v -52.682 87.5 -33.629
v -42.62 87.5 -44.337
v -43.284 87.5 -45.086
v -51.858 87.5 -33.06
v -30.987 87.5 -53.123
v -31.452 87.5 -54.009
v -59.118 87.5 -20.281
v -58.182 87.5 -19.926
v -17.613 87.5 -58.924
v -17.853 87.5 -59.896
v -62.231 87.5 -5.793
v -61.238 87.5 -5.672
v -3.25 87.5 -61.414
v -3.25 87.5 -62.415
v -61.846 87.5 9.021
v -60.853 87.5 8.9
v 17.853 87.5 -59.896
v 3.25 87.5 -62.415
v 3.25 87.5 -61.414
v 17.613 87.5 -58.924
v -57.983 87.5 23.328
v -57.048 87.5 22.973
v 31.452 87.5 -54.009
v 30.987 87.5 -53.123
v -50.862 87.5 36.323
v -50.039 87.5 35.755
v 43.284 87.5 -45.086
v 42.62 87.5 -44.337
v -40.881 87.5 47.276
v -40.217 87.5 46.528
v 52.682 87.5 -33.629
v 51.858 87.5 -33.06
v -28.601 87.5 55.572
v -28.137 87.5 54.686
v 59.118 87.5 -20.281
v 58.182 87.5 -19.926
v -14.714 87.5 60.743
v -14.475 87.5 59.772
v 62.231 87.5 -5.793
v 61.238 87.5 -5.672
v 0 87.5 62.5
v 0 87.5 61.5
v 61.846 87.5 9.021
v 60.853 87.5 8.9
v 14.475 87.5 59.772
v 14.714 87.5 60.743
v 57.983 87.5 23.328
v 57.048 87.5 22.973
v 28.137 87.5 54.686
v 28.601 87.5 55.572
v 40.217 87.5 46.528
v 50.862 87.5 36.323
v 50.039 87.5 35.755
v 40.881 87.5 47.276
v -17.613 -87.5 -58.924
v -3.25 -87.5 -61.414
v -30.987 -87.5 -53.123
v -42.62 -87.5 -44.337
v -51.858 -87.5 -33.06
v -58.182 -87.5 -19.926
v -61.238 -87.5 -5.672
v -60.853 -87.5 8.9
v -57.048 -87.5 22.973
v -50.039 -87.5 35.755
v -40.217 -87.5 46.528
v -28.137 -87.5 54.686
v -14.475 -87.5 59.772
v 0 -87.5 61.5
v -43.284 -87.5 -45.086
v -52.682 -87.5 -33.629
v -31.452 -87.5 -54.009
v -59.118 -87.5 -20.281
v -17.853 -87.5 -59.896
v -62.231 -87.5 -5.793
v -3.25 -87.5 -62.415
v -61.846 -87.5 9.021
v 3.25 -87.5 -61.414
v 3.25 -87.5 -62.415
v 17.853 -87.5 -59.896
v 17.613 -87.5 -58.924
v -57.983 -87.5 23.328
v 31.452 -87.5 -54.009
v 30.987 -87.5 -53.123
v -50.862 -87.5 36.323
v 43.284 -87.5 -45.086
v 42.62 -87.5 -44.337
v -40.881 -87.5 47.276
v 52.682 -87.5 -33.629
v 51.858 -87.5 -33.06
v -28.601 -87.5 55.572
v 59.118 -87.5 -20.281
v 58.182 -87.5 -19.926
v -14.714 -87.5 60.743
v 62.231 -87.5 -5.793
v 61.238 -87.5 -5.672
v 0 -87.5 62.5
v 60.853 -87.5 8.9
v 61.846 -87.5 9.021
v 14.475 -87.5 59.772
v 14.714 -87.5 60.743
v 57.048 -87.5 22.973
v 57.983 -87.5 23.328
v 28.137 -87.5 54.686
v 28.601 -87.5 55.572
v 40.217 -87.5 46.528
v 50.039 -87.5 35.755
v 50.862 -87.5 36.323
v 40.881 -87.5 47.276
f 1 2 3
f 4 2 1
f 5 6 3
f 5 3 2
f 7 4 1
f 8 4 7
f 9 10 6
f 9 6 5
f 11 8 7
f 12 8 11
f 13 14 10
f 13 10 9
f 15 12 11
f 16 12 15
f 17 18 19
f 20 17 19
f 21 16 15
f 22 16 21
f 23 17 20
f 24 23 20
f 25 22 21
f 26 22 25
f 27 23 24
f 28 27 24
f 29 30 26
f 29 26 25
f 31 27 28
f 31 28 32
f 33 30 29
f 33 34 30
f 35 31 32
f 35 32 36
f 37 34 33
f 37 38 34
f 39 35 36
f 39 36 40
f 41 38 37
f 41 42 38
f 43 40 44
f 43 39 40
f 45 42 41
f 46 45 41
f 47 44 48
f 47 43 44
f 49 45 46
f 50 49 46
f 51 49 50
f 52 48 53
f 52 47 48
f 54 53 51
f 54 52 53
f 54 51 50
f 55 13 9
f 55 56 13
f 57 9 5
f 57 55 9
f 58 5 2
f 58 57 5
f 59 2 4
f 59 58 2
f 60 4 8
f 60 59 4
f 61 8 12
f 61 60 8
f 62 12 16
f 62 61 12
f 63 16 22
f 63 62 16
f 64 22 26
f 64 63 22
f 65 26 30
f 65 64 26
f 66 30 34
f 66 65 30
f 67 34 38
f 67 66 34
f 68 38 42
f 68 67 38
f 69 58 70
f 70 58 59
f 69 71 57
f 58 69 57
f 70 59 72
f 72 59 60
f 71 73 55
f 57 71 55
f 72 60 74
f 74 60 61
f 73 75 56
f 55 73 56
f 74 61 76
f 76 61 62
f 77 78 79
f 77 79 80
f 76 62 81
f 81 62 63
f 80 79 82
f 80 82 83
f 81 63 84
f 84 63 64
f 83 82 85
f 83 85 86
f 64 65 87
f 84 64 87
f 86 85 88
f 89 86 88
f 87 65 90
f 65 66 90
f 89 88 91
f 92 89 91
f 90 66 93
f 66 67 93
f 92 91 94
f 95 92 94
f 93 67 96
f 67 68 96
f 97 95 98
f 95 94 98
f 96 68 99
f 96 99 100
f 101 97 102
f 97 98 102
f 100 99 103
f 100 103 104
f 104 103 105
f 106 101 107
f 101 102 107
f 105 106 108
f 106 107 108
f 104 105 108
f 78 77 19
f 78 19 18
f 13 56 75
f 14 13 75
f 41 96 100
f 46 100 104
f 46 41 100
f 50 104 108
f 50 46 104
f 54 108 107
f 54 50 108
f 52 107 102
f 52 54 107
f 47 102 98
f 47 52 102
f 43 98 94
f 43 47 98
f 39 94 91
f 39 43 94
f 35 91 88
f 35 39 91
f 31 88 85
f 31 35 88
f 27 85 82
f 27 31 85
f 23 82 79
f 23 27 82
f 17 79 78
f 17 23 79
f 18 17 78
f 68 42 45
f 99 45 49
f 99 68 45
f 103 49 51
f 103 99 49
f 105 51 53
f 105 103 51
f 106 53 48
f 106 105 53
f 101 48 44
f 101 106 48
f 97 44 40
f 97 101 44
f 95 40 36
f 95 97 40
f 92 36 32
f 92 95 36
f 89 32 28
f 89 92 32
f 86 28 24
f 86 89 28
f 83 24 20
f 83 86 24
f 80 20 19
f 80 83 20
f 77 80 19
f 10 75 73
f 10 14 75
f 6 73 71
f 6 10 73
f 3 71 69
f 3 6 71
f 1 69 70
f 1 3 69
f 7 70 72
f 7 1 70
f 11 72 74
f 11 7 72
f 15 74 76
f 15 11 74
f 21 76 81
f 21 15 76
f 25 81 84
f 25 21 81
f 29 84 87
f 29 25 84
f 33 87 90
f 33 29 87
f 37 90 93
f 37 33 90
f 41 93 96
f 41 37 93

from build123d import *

# Parameters (mm, degrees)
SKETCH1_R           = 62.5
SKETCH1_R_2         = 61.5
BOSS_EXTRUDE1_DEPTH = 87.5
SKETCH2_W           = 6.5
SKETCH2_H           = 1.085934022
CUT_EXTRUDE1_DEPTH  = 197.054839267


with BuildPart() as part:
    # Sketch1 → Boss-Extrude1 (new, symmetric)
    with BuildSketch(Plane(origin=(0, 0, 0), x_dir=(1, 0, 0), z_dir=(0, 1, 0))):
        with Locations(Location((0, 0, 0), (0, 0, 270))):
            Circle(SKETCH1_R)
        with Locations(Location((0, 0, 0), (0, 0, 270))):
            Circle(SKETCH1_R_2, mode=Mode.SUBTRACT)
    extrude(amount=BOSS_EXTRUDE1_DEPTH, both=True)

    # Sketch2 → Cut-Extrude1 (cut, through all)
    with BuildSketch(Plane(origin=(0, 87.5, 0), x_dir=(1, 0, 0), z_dir=(0, 1, 0))):
        with Locations((0, 61.957032989)):
            Rectangle(SKETCH2_W, SKETCH2_H)
    extrude(amount=-CUT_EXTRUDE1_DEPTH, mode=Mode.SUBTRACT)


solid = part.part
